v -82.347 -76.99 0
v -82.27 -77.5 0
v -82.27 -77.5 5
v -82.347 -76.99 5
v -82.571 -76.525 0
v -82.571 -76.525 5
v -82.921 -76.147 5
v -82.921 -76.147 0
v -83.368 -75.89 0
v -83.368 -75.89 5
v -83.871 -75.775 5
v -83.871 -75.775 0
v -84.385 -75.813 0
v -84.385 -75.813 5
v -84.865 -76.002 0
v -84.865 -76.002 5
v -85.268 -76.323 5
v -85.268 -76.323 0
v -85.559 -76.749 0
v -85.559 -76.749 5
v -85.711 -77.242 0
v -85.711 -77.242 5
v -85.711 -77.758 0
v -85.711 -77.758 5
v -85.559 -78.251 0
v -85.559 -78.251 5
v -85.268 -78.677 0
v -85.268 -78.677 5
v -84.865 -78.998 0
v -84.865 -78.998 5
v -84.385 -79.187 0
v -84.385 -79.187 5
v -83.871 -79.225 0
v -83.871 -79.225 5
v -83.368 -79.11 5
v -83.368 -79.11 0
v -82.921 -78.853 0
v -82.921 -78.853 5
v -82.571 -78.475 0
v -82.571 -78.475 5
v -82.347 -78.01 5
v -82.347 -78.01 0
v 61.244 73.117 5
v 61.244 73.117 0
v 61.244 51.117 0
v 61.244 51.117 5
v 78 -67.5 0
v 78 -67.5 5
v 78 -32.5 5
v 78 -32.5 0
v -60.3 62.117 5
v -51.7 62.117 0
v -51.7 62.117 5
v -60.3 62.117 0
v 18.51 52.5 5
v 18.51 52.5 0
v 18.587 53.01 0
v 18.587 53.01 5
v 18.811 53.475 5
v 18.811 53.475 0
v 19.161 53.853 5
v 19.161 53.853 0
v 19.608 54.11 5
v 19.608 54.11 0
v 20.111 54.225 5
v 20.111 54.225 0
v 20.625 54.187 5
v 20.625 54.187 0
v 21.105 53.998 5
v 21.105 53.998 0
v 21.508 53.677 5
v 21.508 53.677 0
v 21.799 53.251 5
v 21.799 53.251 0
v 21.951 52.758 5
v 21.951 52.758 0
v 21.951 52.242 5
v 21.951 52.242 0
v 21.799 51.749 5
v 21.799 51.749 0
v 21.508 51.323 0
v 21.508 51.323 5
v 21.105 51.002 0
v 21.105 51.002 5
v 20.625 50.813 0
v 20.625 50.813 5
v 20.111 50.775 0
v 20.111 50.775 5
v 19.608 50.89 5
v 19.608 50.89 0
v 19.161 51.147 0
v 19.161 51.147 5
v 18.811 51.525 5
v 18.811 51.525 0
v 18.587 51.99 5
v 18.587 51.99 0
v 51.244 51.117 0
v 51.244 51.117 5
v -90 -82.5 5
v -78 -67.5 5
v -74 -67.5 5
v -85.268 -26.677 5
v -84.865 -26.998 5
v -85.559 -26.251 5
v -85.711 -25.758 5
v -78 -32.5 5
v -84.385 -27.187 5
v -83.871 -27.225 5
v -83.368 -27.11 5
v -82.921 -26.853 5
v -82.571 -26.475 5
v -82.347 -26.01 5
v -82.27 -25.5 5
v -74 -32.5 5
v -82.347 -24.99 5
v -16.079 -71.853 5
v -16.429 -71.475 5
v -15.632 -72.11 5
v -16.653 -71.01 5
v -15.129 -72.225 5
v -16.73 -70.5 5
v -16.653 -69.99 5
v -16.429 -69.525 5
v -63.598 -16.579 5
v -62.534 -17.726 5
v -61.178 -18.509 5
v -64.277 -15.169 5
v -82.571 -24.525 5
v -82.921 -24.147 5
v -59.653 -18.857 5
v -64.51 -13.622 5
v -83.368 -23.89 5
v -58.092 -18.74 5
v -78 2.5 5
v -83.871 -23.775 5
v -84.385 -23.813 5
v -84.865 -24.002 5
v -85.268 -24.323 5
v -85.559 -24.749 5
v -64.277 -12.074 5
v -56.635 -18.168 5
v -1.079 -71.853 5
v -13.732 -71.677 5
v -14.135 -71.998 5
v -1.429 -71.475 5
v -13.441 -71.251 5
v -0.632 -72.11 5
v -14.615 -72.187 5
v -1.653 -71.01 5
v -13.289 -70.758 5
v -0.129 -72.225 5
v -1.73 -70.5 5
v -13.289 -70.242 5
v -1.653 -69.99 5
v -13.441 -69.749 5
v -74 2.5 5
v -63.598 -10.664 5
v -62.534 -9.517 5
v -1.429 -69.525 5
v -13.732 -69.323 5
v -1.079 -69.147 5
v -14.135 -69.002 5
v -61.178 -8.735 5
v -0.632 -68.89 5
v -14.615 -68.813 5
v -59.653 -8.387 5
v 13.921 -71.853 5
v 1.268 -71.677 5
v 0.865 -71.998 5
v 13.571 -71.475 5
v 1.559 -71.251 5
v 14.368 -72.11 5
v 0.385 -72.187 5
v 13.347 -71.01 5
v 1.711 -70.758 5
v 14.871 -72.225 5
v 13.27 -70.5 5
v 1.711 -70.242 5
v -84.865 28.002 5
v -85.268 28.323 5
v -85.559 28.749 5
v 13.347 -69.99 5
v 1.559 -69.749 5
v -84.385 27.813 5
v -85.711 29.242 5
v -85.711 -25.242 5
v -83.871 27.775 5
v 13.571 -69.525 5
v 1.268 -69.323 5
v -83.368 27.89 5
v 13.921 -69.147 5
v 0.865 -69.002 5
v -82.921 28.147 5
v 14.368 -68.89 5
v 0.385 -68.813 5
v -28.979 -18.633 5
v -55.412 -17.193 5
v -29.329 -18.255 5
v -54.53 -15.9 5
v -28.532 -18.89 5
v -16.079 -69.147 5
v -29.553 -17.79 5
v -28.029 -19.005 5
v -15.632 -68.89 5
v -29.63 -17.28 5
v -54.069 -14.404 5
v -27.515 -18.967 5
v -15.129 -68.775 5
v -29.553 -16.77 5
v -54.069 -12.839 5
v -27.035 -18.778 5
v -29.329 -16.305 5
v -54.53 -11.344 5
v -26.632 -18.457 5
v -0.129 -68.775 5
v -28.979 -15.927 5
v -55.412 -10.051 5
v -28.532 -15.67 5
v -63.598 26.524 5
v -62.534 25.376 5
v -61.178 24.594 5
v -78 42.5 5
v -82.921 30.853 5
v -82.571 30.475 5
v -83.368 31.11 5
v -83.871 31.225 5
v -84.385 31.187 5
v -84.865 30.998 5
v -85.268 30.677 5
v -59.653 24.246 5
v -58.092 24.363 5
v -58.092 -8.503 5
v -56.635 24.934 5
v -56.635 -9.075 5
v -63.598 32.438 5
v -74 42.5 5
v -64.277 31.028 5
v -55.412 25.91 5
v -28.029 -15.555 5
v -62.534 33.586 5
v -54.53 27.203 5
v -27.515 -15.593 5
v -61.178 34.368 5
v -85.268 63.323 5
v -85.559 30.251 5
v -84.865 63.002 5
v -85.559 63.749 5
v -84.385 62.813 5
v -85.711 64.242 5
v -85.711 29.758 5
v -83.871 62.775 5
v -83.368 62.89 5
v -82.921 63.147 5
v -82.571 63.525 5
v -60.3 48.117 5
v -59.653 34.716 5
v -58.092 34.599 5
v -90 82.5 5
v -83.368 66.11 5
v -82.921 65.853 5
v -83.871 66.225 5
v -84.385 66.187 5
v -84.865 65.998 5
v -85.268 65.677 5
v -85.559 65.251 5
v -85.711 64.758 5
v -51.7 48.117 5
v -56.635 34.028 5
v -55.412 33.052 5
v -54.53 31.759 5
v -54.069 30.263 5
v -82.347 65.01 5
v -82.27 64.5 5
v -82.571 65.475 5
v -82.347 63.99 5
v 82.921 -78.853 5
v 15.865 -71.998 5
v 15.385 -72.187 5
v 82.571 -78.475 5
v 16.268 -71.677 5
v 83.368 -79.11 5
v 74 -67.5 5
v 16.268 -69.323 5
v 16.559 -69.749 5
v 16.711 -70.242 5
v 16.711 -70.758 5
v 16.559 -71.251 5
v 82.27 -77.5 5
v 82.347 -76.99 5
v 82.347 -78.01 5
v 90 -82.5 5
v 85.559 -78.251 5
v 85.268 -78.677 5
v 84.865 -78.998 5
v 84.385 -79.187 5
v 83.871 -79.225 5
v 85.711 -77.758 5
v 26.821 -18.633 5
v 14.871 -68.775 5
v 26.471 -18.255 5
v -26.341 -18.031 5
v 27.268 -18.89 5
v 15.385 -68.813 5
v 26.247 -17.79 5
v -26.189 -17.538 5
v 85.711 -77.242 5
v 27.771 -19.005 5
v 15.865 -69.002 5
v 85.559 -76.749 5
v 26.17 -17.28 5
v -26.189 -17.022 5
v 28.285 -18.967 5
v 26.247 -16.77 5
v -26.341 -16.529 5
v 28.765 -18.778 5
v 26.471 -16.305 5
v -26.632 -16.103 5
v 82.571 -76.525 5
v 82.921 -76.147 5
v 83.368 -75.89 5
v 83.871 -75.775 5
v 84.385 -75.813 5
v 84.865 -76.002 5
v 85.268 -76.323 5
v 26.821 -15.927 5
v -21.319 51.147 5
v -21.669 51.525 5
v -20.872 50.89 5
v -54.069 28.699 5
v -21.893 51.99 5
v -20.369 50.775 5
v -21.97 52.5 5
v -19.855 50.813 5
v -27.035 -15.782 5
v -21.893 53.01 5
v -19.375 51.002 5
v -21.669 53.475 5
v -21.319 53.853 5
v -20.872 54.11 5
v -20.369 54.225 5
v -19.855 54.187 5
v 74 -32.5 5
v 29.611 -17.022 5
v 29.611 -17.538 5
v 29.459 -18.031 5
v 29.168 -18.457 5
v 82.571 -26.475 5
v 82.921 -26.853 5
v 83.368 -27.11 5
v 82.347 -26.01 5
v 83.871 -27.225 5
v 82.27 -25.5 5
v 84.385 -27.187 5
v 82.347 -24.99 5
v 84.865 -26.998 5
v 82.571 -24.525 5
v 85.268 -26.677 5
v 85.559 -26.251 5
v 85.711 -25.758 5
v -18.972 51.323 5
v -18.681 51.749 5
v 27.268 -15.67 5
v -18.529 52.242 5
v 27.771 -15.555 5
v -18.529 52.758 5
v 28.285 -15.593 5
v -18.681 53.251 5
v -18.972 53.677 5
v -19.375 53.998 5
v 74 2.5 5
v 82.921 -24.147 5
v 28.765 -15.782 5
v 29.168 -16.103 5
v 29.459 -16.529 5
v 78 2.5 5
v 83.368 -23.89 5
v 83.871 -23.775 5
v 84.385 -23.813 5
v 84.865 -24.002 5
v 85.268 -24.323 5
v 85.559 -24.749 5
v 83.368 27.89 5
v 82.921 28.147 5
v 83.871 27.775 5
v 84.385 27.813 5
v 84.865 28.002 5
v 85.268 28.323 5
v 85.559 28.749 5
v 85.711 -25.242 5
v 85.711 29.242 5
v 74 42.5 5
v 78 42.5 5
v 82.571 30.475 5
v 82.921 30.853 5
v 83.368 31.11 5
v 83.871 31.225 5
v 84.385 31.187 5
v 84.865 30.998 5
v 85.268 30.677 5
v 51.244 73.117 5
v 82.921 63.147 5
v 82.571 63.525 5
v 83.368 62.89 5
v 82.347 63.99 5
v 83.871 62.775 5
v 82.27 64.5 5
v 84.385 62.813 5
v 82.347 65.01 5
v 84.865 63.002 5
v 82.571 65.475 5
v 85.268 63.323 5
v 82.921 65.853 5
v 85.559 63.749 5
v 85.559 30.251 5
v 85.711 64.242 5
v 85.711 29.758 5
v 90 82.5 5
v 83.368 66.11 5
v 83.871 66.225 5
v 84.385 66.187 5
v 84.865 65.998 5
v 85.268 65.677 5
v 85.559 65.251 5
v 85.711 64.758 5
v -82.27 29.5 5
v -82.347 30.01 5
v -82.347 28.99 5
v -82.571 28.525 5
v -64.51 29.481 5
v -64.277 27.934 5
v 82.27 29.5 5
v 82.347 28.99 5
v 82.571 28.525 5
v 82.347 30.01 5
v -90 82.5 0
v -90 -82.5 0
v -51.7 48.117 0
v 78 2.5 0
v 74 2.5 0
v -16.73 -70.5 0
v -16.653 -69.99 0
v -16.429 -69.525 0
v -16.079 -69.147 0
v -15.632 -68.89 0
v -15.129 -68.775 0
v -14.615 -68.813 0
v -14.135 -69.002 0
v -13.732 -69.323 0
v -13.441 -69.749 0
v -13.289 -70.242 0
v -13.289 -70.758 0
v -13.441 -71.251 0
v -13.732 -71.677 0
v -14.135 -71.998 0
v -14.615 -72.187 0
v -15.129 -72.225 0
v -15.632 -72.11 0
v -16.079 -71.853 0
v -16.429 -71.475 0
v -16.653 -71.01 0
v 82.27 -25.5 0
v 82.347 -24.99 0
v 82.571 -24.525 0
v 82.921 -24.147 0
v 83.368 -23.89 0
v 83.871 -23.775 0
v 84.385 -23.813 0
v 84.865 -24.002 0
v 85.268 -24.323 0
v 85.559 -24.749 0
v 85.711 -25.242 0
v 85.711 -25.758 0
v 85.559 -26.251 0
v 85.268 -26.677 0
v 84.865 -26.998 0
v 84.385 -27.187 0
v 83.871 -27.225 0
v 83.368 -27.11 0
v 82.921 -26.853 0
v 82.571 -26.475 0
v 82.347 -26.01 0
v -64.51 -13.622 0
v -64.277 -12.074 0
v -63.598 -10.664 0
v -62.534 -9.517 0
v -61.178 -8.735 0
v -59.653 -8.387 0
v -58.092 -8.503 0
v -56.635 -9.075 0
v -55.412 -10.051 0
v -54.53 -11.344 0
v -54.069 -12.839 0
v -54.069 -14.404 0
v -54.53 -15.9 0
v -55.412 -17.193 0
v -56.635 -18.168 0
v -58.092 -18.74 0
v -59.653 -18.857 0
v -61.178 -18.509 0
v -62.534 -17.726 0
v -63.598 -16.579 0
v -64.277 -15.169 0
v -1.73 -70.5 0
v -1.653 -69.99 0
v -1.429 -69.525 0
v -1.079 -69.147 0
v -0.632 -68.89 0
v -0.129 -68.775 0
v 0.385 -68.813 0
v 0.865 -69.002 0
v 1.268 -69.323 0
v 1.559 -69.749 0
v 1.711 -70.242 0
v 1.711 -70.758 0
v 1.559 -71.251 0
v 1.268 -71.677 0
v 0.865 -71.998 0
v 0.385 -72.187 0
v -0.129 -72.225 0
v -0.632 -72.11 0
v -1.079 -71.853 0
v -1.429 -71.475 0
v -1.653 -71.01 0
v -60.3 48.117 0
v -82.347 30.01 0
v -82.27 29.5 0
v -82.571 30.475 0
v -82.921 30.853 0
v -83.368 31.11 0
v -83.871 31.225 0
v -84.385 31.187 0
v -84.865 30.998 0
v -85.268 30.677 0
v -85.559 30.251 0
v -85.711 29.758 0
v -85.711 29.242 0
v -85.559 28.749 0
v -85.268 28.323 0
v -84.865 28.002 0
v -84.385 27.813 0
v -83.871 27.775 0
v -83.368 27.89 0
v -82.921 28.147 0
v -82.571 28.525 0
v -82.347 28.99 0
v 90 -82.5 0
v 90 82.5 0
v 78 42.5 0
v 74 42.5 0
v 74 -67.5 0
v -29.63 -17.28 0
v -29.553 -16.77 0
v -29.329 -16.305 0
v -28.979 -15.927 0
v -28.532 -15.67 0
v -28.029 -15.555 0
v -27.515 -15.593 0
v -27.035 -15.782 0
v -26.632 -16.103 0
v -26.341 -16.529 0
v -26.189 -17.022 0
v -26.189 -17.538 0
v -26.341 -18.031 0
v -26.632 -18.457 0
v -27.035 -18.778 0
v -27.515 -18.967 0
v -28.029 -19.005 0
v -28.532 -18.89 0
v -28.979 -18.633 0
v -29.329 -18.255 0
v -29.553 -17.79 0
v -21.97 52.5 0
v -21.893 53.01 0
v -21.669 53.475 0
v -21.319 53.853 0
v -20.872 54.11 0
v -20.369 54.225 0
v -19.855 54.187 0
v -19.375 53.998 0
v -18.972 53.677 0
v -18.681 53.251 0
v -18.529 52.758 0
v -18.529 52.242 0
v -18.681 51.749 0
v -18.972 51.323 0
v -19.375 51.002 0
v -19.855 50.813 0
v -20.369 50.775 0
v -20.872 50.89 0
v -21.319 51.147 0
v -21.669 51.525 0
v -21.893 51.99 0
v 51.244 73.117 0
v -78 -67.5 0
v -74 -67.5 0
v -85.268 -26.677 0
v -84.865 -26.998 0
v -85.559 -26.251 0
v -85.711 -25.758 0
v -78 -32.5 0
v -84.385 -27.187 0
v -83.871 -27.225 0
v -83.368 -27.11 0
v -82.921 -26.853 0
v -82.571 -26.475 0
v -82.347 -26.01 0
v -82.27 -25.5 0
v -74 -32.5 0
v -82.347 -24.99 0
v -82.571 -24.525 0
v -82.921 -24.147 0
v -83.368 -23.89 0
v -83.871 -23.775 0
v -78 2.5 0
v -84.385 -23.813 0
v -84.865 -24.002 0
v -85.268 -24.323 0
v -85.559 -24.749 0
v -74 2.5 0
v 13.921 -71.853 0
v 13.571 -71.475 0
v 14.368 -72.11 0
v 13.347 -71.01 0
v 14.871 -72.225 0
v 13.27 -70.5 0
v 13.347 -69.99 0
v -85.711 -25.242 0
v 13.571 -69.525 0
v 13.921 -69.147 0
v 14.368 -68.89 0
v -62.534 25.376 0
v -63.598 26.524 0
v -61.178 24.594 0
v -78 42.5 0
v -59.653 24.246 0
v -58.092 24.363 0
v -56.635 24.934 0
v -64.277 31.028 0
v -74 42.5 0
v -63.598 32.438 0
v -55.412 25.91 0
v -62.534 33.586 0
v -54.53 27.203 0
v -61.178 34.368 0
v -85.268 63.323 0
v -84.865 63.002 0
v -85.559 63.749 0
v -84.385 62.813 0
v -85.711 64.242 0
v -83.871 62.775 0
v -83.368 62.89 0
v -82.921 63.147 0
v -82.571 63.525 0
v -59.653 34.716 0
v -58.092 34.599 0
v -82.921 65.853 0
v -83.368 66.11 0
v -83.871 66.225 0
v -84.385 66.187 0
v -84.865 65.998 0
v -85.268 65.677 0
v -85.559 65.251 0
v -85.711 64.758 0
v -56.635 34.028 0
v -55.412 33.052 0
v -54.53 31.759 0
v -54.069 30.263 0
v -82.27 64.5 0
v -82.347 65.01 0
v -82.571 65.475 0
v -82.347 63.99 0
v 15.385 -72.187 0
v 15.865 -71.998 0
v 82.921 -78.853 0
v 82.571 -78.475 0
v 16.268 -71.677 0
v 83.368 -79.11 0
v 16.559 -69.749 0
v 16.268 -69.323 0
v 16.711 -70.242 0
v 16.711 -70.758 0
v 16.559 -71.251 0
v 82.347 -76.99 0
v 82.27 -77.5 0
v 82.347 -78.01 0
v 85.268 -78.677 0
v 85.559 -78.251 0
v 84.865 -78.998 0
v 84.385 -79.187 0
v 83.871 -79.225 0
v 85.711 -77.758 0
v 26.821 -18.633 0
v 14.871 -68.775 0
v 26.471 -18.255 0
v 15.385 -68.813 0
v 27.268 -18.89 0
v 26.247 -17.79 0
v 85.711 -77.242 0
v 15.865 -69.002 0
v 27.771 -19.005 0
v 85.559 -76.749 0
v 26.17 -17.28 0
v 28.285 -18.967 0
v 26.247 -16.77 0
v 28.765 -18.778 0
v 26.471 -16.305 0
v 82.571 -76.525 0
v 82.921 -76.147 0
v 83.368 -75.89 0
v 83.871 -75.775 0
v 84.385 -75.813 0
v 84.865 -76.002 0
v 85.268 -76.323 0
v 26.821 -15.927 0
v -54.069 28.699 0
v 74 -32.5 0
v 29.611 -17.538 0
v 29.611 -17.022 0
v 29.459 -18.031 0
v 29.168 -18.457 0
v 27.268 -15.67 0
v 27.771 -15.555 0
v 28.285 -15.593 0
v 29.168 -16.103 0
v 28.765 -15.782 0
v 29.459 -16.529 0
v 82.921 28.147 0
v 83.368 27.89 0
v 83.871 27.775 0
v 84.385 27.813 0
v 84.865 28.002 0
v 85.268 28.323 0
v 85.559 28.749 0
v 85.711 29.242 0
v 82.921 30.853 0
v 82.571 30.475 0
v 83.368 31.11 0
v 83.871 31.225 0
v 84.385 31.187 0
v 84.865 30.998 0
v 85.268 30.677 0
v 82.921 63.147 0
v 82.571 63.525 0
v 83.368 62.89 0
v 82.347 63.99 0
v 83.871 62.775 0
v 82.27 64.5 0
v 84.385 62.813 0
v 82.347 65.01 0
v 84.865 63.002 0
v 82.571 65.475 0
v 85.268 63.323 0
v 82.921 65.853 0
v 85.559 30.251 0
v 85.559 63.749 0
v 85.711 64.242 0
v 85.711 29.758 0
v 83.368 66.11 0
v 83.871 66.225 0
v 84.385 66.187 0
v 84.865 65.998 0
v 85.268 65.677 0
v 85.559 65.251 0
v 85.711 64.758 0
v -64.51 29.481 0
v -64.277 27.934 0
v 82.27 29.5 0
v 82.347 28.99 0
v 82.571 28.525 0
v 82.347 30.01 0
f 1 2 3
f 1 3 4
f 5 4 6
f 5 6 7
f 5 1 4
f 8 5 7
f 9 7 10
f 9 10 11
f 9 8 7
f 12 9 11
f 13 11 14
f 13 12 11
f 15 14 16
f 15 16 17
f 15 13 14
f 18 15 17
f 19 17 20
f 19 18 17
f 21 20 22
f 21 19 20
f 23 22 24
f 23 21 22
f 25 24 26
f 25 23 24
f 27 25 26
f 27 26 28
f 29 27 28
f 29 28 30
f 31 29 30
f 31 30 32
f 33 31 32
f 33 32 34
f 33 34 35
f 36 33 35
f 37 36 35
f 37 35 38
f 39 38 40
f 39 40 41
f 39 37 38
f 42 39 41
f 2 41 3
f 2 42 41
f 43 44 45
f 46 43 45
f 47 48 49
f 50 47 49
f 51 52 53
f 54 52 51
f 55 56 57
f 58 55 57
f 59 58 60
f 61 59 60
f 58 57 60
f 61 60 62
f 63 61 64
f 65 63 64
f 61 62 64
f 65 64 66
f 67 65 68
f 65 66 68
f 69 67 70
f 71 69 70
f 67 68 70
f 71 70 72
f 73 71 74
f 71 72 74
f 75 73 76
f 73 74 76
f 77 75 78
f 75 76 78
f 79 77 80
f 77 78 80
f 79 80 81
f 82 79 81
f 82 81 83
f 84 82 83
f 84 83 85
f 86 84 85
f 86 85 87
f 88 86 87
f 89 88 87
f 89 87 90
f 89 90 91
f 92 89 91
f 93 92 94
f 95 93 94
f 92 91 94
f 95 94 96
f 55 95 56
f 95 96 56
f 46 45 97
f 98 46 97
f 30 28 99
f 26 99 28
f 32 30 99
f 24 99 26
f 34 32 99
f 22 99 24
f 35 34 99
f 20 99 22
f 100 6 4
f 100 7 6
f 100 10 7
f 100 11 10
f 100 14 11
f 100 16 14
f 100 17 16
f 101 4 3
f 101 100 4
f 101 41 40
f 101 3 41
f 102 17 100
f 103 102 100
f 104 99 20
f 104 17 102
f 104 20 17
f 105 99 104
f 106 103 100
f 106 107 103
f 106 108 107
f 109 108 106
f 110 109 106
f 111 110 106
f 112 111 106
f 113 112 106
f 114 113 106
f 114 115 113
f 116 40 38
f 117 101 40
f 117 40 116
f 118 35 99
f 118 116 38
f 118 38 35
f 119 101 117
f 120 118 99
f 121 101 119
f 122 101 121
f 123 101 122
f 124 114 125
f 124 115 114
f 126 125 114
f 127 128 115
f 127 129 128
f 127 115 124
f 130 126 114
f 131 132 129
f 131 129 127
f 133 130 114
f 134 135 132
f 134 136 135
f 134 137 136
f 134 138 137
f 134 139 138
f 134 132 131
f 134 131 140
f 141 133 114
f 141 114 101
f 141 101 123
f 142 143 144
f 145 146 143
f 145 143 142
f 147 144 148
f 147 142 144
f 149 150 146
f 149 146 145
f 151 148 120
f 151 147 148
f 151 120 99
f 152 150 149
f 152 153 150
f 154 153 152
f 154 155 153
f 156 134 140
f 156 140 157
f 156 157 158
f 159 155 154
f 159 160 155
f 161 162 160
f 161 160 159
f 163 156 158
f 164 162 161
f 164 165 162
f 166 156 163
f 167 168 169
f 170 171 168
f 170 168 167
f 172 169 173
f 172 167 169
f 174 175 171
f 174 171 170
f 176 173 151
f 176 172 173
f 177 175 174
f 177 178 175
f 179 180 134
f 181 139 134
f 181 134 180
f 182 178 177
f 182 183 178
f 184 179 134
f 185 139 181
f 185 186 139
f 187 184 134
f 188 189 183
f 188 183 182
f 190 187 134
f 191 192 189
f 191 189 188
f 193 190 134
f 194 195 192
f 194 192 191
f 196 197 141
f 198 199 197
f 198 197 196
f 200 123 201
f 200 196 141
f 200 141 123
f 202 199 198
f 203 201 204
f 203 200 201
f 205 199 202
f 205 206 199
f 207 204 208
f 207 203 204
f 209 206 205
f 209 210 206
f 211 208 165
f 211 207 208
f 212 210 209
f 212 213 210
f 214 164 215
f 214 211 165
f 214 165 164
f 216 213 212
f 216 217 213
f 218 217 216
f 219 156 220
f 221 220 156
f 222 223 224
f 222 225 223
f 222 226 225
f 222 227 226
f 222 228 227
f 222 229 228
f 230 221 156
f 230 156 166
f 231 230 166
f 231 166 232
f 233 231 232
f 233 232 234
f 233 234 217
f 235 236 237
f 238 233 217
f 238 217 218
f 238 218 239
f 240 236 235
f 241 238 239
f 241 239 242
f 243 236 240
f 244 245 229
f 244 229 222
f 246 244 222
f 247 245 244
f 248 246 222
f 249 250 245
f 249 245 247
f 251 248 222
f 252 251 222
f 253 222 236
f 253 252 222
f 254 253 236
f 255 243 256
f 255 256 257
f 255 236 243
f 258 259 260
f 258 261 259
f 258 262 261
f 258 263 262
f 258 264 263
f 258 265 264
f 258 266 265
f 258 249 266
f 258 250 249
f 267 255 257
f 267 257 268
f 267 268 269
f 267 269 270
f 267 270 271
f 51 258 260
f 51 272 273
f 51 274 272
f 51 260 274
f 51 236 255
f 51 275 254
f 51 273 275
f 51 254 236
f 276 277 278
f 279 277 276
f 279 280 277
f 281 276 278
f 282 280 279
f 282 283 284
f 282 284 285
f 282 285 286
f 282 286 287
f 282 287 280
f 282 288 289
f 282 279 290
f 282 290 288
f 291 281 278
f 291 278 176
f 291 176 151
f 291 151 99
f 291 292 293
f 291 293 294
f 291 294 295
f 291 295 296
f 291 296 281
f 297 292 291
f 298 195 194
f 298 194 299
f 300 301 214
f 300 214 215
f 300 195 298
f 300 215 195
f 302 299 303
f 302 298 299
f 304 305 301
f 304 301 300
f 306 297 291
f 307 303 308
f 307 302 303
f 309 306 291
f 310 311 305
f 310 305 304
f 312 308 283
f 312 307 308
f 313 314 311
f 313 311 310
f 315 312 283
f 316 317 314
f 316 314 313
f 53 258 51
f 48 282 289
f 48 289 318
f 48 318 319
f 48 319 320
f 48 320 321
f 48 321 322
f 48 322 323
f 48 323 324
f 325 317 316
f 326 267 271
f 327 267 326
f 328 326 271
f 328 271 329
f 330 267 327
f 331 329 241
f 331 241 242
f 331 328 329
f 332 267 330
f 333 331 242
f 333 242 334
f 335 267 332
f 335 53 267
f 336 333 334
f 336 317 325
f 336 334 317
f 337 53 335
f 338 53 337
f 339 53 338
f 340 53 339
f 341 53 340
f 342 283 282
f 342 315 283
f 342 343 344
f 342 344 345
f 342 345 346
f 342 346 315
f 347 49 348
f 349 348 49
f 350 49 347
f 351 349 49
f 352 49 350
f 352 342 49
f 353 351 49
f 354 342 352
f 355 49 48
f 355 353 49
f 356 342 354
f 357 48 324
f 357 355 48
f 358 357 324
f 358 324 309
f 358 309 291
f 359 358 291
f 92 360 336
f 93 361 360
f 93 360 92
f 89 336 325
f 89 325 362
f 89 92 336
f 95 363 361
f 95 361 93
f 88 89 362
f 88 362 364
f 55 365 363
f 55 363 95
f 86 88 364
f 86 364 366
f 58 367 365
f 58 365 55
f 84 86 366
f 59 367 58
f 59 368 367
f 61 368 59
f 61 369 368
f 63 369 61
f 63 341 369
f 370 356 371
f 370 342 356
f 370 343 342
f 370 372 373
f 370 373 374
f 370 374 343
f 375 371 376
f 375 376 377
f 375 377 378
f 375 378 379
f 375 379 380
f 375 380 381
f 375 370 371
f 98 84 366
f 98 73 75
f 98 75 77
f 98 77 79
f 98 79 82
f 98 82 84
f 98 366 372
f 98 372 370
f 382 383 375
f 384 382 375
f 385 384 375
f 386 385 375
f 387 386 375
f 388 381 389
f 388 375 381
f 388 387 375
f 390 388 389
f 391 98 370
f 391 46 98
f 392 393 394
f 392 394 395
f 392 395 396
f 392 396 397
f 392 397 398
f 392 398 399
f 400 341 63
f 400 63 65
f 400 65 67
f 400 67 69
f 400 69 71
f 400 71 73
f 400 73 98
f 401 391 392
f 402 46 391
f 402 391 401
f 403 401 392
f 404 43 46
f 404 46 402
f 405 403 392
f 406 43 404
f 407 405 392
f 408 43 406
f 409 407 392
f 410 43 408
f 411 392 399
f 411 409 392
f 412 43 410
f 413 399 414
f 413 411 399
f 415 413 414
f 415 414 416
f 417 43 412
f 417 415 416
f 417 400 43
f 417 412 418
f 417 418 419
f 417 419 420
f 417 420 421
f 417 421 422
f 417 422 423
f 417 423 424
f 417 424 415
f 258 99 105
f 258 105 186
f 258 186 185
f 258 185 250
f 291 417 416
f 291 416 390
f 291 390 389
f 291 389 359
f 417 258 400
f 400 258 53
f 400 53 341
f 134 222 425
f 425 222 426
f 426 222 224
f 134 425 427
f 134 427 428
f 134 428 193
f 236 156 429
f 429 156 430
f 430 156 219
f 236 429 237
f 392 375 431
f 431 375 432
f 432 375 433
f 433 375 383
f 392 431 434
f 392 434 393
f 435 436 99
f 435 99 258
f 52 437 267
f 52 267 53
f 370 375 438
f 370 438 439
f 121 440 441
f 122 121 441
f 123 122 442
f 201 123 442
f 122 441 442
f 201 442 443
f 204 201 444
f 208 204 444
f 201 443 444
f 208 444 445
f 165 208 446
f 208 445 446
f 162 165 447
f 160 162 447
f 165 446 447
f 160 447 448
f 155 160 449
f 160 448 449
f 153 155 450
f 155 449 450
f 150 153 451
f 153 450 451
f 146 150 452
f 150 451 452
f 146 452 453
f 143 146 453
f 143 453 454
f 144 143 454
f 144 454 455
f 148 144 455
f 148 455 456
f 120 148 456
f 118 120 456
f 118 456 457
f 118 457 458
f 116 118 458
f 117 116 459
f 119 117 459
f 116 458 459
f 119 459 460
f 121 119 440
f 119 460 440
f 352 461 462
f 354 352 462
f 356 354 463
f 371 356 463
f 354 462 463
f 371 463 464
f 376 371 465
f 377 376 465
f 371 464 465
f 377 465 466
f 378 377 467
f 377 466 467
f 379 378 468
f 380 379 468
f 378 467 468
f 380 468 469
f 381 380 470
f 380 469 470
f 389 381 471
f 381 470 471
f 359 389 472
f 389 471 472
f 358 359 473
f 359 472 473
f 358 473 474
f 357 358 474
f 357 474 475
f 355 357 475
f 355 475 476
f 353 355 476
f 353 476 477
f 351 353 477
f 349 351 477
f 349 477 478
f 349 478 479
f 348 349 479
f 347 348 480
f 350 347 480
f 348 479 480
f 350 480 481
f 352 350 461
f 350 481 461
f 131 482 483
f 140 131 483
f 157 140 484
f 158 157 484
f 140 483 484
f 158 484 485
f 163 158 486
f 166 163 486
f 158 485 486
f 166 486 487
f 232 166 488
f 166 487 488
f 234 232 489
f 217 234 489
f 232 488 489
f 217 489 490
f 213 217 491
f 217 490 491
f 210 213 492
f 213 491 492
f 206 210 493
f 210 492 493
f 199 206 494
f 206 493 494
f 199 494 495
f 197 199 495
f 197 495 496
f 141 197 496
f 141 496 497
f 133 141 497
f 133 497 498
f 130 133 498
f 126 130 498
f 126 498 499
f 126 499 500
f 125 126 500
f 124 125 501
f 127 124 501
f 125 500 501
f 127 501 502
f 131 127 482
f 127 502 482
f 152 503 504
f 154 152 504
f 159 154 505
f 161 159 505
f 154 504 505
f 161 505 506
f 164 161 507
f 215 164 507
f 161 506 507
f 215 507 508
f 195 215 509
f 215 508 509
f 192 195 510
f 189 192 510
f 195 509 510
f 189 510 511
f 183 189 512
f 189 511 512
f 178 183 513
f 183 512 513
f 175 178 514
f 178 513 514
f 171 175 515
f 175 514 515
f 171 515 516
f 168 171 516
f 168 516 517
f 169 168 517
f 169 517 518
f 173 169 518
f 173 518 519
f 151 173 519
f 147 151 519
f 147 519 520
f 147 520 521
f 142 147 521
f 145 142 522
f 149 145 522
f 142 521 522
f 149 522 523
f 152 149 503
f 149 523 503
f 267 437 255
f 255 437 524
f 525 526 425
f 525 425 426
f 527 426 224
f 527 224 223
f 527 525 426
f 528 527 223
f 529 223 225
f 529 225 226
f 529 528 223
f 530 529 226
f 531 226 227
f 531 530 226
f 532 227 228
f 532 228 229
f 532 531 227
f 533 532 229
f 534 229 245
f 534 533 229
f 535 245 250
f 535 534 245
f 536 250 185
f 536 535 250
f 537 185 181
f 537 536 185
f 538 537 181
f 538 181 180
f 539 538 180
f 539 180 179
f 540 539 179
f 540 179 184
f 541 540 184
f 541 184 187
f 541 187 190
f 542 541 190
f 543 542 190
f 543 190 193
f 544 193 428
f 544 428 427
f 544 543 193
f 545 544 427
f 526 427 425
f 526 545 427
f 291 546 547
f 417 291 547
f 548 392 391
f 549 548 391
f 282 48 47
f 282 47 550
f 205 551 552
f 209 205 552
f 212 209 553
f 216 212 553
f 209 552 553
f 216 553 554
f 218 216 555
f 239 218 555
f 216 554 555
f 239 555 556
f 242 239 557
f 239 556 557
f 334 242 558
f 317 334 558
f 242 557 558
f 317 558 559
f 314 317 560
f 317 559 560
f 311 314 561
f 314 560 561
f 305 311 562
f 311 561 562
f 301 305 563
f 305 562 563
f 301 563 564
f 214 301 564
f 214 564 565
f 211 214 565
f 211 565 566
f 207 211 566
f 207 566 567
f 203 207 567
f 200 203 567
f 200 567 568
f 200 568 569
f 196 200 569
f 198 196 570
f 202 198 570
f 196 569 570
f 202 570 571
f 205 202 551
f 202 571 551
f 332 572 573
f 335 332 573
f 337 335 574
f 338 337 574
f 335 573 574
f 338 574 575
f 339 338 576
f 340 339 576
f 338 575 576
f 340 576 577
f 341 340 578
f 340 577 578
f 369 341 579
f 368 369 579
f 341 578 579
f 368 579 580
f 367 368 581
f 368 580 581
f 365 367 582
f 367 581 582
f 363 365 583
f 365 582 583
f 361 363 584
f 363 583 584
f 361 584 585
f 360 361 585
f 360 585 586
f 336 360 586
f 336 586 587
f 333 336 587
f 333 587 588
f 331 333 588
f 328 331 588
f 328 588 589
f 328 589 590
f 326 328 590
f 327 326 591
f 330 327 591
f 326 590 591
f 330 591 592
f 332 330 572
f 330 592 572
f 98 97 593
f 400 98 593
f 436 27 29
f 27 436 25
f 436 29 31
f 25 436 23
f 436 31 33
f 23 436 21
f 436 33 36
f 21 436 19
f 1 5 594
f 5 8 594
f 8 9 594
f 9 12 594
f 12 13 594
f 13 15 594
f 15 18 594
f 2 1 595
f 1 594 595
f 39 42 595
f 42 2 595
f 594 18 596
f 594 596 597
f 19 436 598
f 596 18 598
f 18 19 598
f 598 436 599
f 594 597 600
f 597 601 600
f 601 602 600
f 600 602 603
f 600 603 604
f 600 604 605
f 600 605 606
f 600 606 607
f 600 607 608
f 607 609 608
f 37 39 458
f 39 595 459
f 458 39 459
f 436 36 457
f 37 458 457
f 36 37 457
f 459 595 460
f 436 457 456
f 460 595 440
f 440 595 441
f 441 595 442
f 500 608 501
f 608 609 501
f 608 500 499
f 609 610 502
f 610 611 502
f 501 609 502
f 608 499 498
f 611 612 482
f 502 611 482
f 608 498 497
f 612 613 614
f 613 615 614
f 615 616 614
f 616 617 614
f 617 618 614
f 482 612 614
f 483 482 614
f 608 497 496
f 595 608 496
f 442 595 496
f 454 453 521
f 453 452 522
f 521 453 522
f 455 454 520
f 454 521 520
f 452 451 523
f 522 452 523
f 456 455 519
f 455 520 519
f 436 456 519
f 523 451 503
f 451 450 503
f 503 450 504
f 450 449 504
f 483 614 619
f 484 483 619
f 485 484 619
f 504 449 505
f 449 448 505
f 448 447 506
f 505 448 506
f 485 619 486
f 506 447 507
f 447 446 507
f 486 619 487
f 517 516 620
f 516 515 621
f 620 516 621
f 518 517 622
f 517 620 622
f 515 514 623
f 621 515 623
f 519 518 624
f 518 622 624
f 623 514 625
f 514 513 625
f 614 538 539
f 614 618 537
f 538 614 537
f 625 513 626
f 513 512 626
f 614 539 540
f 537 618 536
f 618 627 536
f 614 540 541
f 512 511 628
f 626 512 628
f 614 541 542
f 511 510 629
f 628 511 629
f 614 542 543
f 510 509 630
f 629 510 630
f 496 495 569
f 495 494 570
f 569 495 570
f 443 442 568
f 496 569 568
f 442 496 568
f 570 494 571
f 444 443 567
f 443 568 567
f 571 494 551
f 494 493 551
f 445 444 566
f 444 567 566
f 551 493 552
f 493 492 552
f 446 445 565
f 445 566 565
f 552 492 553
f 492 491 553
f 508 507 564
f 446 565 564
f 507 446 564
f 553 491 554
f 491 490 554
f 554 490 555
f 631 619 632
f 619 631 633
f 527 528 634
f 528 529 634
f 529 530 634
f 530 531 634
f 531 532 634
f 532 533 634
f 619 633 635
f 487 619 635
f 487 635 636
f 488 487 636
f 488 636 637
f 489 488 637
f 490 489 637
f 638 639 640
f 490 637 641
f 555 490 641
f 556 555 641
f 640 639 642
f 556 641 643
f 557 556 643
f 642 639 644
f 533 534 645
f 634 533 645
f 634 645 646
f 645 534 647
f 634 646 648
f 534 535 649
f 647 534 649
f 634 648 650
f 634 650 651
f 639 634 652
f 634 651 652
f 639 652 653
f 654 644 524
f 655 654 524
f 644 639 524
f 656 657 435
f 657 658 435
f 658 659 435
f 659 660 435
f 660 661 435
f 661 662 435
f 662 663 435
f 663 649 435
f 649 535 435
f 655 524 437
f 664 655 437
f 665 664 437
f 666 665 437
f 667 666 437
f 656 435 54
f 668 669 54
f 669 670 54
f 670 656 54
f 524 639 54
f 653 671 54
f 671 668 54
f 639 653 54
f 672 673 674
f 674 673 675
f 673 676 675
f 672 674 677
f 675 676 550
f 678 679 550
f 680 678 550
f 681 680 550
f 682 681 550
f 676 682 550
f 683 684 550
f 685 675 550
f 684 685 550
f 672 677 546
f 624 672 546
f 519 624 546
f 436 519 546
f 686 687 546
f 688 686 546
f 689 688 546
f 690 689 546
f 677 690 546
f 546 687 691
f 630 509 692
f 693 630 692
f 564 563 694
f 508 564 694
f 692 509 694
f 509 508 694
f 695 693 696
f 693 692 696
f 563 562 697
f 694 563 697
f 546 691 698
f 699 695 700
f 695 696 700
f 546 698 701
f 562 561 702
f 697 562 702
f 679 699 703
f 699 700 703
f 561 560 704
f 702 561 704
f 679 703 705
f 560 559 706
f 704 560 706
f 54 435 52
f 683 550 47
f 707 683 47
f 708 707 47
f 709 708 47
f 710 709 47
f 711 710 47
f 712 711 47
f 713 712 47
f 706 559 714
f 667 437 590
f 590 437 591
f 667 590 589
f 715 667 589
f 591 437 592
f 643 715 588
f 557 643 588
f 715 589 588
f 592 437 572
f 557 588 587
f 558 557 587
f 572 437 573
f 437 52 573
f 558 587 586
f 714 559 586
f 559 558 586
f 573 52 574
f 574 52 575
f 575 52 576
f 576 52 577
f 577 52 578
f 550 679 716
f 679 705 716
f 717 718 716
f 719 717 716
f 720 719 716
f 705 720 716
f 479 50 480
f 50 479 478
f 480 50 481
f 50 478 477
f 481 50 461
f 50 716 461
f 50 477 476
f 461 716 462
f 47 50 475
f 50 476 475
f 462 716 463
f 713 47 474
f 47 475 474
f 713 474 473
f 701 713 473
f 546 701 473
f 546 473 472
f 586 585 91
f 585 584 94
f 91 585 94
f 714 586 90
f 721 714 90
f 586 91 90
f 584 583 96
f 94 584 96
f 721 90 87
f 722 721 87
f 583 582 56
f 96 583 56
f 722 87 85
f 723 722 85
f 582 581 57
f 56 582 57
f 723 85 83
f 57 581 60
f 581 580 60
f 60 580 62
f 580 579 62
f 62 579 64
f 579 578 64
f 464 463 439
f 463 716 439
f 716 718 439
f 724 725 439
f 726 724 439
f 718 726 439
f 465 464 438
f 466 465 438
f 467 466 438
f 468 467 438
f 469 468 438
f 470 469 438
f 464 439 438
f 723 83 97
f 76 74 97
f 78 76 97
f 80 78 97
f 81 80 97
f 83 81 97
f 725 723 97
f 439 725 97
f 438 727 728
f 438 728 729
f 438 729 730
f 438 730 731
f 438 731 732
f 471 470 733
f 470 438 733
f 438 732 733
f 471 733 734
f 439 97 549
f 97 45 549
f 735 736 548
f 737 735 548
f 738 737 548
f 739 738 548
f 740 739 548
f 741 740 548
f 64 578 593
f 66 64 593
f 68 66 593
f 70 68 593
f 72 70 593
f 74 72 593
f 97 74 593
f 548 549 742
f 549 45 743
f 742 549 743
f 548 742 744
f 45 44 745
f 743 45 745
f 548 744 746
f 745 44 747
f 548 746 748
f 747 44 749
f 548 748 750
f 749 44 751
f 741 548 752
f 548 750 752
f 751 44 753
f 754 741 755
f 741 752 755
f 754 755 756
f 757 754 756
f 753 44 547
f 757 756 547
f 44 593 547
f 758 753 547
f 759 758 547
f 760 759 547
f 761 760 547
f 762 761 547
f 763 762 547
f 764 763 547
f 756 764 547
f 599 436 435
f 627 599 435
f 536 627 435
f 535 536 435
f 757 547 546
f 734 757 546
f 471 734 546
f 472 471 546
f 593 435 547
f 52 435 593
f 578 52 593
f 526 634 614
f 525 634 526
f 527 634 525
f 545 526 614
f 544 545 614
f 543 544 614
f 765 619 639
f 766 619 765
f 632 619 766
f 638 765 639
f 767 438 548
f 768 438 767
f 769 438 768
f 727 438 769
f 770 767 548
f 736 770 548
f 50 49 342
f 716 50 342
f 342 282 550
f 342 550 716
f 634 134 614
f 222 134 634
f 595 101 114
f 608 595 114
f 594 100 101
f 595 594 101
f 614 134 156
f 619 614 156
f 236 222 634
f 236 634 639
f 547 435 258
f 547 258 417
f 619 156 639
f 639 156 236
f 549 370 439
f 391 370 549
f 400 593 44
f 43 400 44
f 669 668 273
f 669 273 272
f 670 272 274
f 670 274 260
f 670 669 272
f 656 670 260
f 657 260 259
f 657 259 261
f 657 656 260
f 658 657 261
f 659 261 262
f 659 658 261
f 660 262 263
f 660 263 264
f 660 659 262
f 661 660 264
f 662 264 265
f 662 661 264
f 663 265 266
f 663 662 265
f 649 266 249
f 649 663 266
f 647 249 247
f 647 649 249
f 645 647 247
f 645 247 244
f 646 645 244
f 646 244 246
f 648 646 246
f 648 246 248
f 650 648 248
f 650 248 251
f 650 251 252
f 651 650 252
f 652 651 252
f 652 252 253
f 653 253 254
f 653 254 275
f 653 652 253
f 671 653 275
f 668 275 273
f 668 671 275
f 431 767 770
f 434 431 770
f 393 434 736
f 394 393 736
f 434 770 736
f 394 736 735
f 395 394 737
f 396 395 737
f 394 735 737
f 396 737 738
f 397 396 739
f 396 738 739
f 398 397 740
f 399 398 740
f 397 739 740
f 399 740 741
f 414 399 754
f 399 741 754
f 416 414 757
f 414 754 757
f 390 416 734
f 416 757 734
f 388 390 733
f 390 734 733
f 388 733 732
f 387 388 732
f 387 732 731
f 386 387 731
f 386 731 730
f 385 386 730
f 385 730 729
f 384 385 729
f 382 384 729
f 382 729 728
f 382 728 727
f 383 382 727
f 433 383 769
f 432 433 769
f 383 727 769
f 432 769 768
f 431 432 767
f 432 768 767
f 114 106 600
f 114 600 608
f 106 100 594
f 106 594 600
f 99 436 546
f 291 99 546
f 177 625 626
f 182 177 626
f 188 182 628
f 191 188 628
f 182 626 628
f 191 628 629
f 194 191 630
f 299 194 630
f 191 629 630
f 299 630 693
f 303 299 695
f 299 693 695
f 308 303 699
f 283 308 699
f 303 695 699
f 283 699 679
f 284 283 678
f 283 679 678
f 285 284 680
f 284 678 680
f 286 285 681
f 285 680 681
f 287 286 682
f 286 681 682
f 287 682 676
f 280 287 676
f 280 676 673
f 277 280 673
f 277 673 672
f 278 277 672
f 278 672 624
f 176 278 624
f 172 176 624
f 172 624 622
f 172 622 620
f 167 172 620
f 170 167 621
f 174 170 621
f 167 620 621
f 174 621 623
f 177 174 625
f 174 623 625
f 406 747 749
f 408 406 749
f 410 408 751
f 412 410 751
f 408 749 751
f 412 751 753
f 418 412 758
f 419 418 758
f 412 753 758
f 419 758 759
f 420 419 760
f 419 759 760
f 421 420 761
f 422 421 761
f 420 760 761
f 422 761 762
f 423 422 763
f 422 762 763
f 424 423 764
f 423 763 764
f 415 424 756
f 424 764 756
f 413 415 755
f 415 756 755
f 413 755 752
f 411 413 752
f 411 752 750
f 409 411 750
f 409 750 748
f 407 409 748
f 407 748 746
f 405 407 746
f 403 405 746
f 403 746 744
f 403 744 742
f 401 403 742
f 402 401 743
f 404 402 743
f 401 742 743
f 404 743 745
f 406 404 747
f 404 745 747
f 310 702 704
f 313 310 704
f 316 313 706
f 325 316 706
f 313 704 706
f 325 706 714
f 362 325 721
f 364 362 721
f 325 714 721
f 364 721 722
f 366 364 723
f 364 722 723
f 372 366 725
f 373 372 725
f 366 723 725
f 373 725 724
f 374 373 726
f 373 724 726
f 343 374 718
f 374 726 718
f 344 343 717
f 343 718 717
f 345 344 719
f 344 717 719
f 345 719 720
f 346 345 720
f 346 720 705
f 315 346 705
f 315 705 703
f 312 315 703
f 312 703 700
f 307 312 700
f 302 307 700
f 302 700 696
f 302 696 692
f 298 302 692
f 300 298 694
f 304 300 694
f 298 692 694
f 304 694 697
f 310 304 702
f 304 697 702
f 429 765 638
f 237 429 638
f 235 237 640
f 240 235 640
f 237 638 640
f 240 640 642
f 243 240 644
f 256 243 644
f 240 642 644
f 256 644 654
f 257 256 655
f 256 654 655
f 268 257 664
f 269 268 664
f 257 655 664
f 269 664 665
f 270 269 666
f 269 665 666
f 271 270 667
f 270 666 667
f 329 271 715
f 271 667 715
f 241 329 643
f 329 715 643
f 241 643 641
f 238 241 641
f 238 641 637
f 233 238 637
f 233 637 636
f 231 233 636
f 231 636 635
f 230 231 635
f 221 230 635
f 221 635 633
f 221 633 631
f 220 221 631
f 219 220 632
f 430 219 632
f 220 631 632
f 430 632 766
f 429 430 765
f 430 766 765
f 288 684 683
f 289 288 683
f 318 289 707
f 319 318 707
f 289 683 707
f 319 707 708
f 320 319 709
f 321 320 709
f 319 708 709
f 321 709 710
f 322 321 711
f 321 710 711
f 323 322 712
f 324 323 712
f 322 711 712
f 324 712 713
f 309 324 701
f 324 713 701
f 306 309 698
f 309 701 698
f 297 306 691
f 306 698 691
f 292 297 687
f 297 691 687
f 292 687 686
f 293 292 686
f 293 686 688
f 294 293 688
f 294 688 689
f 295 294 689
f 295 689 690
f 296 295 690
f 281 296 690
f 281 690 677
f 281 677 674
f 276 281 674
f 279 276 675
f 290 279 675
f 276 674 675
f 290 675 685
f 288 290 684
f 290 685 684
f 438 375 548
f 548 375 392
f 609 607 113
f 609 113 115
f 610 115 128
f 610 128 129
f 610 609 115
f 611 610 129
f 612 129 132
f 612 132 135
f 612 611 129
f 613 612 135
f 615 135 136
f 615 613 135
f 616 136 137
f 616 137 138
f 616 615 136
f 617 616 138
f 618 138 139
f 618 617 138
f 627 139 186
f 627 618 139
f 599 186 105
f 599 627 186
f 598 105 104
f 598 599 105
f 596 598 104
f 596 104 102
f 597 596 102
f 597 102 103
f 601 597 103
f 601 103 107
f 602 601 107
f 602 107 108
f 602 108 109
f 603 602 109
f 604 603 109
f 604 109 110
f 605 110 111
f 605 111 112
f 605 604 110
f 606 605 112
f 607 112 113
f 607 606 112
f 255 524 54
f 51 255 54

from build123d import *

# Parameters (mm, degrees)
SKETCH1_W           = 180
SKETCH1_H           = 165
BOSS_EXTRUDE1_DEPTH = 5
SKETCH2_W           = 4
SKETCH2_H           = 40
CUT_EXTRUDE1_DEPTH  = 5
SKETCH2_3_W         = 4
SKETCH2_3_H         = 35
CUT_EXTRUDE2_DEPTH  = 5
SKETCH3_R           = 1.73
CUT_EXTRUDE3_DEPTH  = 5
SKETCH4_R           = 1.73
CUT_EXTRUDE4_DEPTH  = 5
CUT_EXTRUDE6_DEPTH  = 5
SKETCH5_4_R         = 5.25
SKETCH5_4_W         = 8.6
SKETCH5_4_H         = 14
CUT_EXTRUDE7_DEPTH  = 5
SKETCH6_R           = 1.73
CUT_EXTRUDE8_DEPTH  = 5


with BuildPart() as part:
    # Sketch1 → Boss-Extrude1 (new body)
    with BuildSketch(Plane.XY):
        Rectangle(SKETCH1_W, SKETCH1_H)
    extrude(amount=BOSS_EXTRUDE1_DEPTH)

    # Sketch2 → Cut-Extrude1 (cut)
    with BuildSketch(Plane.XY.offset(5)):
        with Locations((-76, 22.5)):
            Rectangle(SKETCH2_W, SKETCH2_H)
    cut_extrude1 = extrude(amount=-CUT_EXTRUDE1_DEPTH, mode=Mode.SUBTRACT)

    # Sketch2<3> → Cut-Extrude2 (cut)
    with BuildSketch(Plane.XY.offset(5)):
        with Locations((-76, -50)):
            Rectangle(SKETCH2_3_W, SKETCH2_3_H)
    cut_extrude2 = extrude(amount=-CUT_EXTRUDE2_DEPTH, mode=Mode.SUBTRACT)

    # Mirror1: Cut-Extrude1, Cut-Extrude2 across plane
    add(cut_extrude1.mirror(Plane(origin=(0, 0, 0), x_dir=(0, 0, 1), z_dir=(1, 0, 0))), mode=Mode.SUBTRACT)
    add(cut_extrude2.mirror(Plane(origin=(0, 0, 0), x_dir=(0, 0, 1), z_dir=(1, 0, 0))), mode=Mode.SUBTRACT)

    # Sketch3 → Cut-Extrude3 (cut)
    with BuildSketch(Plane(origin=(0, 0, 0), x_dir=(-1, 0, 0), z_dir=(0, 0, -1))):
        with Locations((-84, -77.5)):
            Circle(SKETCH3_R)
        with Locations((-84, -25.5)):
            Circle(SKETCH3_R)
        with Locations((-84, 29.5)):
            Circle(SKETCH3_R)
        with Locations((-84, 64.5)):
            Circle(SKETCH3_R)
    cut_extrude3 = extrude(amount=-CUT_EXTRUDE3_DEPTH, mode=Mode.SUBTRACT)

    # Mirror2: Cut-Extrude3 across plane
    add(cut_extrude3.mirror(Plane(origin=(0, 0, 0), x_dir=(0, 0, 1), z_dir=(1, 0, 0))), mode=Mode.SUBTRACT)

    # Sketch4 → Cut-Extrude4 (cut)
    with BuildSketch(Plane(origin=(0, 0, 0), x_dir=(-1, 0, 0), z_dir=(0, 0, -1))):
        with Locations((-20.24, 52.5)):
            Circle(SKETCH4_R)
        with Locations((20.24, 52.5)):
            Circle(SKETCH4_R)
        with Locations((-27.9, -17.28)):
            Circle(SKETCH4_R)
        with Locations((27.9, -17.28)):
            Circle(SKETCH4_R)
    extrude(amount=-CUT_EXTRUDE4_DEPTH, mode=Mode.SUBTRACT)

    # Sketch5 → Cut-Extrude6 (cut)
    with BuildSketch(Plane(origin=(0, 0, 0), x_dir=(-1, 0, 0), z_dir=(0, 0, -1))):
        Polygon((-56.244150745, 73.117395969), (-61.244150745, 73.117395969), (-61.244150745, 51.117395969), (-51.244150745, 51.117395969), (-51.244150745, 73.117395969), align=None)
    extrude(amount=-CUT_EXTRUDE6_DEPTH, mode=Mode.SUBTRACT)

    # Sketch5<4> → Cut-Extrude7 (cut)
    with BuildSketch(Plane(origin=(0, 0, 0), x_dir=(-1, 0, 0), z_dir=(0, 0, -1))):
        with Locations((59.260446157, 29.480985143)):
            Circle(SKETCH5_4_R)
        with Locations((59.260446157, -13.621859261)):
            Circle(SKETCH5_4_R)
        with Locations((56, 55.117395969)):
            Rectangle(SKETCH5_4_W, SKETCH5_4_H)
    extrude(amount=-CUT_EXTRUDE7_DEPTH, mode=Mode.SUBTRACT)

    # Sketch6 → Cut-Extrude8 (cut)
    with BuildSketch(Plane(origin=(0, 0, 0), x_dir=(-1, 0, 0), z_dir=(0, 0, -1))):
        with Locations((0, -70.5)):
            Circle(SKETCH6_R)
        with Locations((-15, -70.5)):
            Circle(SKETCH6_R)
        with Locations((15, -70.5)):
            Circle(SKETCH6_R)
    extrude(amount=-CUT_EXTRUDE8_DEPTH, mode=Mode.SUBTRACT)


solid = part.part
